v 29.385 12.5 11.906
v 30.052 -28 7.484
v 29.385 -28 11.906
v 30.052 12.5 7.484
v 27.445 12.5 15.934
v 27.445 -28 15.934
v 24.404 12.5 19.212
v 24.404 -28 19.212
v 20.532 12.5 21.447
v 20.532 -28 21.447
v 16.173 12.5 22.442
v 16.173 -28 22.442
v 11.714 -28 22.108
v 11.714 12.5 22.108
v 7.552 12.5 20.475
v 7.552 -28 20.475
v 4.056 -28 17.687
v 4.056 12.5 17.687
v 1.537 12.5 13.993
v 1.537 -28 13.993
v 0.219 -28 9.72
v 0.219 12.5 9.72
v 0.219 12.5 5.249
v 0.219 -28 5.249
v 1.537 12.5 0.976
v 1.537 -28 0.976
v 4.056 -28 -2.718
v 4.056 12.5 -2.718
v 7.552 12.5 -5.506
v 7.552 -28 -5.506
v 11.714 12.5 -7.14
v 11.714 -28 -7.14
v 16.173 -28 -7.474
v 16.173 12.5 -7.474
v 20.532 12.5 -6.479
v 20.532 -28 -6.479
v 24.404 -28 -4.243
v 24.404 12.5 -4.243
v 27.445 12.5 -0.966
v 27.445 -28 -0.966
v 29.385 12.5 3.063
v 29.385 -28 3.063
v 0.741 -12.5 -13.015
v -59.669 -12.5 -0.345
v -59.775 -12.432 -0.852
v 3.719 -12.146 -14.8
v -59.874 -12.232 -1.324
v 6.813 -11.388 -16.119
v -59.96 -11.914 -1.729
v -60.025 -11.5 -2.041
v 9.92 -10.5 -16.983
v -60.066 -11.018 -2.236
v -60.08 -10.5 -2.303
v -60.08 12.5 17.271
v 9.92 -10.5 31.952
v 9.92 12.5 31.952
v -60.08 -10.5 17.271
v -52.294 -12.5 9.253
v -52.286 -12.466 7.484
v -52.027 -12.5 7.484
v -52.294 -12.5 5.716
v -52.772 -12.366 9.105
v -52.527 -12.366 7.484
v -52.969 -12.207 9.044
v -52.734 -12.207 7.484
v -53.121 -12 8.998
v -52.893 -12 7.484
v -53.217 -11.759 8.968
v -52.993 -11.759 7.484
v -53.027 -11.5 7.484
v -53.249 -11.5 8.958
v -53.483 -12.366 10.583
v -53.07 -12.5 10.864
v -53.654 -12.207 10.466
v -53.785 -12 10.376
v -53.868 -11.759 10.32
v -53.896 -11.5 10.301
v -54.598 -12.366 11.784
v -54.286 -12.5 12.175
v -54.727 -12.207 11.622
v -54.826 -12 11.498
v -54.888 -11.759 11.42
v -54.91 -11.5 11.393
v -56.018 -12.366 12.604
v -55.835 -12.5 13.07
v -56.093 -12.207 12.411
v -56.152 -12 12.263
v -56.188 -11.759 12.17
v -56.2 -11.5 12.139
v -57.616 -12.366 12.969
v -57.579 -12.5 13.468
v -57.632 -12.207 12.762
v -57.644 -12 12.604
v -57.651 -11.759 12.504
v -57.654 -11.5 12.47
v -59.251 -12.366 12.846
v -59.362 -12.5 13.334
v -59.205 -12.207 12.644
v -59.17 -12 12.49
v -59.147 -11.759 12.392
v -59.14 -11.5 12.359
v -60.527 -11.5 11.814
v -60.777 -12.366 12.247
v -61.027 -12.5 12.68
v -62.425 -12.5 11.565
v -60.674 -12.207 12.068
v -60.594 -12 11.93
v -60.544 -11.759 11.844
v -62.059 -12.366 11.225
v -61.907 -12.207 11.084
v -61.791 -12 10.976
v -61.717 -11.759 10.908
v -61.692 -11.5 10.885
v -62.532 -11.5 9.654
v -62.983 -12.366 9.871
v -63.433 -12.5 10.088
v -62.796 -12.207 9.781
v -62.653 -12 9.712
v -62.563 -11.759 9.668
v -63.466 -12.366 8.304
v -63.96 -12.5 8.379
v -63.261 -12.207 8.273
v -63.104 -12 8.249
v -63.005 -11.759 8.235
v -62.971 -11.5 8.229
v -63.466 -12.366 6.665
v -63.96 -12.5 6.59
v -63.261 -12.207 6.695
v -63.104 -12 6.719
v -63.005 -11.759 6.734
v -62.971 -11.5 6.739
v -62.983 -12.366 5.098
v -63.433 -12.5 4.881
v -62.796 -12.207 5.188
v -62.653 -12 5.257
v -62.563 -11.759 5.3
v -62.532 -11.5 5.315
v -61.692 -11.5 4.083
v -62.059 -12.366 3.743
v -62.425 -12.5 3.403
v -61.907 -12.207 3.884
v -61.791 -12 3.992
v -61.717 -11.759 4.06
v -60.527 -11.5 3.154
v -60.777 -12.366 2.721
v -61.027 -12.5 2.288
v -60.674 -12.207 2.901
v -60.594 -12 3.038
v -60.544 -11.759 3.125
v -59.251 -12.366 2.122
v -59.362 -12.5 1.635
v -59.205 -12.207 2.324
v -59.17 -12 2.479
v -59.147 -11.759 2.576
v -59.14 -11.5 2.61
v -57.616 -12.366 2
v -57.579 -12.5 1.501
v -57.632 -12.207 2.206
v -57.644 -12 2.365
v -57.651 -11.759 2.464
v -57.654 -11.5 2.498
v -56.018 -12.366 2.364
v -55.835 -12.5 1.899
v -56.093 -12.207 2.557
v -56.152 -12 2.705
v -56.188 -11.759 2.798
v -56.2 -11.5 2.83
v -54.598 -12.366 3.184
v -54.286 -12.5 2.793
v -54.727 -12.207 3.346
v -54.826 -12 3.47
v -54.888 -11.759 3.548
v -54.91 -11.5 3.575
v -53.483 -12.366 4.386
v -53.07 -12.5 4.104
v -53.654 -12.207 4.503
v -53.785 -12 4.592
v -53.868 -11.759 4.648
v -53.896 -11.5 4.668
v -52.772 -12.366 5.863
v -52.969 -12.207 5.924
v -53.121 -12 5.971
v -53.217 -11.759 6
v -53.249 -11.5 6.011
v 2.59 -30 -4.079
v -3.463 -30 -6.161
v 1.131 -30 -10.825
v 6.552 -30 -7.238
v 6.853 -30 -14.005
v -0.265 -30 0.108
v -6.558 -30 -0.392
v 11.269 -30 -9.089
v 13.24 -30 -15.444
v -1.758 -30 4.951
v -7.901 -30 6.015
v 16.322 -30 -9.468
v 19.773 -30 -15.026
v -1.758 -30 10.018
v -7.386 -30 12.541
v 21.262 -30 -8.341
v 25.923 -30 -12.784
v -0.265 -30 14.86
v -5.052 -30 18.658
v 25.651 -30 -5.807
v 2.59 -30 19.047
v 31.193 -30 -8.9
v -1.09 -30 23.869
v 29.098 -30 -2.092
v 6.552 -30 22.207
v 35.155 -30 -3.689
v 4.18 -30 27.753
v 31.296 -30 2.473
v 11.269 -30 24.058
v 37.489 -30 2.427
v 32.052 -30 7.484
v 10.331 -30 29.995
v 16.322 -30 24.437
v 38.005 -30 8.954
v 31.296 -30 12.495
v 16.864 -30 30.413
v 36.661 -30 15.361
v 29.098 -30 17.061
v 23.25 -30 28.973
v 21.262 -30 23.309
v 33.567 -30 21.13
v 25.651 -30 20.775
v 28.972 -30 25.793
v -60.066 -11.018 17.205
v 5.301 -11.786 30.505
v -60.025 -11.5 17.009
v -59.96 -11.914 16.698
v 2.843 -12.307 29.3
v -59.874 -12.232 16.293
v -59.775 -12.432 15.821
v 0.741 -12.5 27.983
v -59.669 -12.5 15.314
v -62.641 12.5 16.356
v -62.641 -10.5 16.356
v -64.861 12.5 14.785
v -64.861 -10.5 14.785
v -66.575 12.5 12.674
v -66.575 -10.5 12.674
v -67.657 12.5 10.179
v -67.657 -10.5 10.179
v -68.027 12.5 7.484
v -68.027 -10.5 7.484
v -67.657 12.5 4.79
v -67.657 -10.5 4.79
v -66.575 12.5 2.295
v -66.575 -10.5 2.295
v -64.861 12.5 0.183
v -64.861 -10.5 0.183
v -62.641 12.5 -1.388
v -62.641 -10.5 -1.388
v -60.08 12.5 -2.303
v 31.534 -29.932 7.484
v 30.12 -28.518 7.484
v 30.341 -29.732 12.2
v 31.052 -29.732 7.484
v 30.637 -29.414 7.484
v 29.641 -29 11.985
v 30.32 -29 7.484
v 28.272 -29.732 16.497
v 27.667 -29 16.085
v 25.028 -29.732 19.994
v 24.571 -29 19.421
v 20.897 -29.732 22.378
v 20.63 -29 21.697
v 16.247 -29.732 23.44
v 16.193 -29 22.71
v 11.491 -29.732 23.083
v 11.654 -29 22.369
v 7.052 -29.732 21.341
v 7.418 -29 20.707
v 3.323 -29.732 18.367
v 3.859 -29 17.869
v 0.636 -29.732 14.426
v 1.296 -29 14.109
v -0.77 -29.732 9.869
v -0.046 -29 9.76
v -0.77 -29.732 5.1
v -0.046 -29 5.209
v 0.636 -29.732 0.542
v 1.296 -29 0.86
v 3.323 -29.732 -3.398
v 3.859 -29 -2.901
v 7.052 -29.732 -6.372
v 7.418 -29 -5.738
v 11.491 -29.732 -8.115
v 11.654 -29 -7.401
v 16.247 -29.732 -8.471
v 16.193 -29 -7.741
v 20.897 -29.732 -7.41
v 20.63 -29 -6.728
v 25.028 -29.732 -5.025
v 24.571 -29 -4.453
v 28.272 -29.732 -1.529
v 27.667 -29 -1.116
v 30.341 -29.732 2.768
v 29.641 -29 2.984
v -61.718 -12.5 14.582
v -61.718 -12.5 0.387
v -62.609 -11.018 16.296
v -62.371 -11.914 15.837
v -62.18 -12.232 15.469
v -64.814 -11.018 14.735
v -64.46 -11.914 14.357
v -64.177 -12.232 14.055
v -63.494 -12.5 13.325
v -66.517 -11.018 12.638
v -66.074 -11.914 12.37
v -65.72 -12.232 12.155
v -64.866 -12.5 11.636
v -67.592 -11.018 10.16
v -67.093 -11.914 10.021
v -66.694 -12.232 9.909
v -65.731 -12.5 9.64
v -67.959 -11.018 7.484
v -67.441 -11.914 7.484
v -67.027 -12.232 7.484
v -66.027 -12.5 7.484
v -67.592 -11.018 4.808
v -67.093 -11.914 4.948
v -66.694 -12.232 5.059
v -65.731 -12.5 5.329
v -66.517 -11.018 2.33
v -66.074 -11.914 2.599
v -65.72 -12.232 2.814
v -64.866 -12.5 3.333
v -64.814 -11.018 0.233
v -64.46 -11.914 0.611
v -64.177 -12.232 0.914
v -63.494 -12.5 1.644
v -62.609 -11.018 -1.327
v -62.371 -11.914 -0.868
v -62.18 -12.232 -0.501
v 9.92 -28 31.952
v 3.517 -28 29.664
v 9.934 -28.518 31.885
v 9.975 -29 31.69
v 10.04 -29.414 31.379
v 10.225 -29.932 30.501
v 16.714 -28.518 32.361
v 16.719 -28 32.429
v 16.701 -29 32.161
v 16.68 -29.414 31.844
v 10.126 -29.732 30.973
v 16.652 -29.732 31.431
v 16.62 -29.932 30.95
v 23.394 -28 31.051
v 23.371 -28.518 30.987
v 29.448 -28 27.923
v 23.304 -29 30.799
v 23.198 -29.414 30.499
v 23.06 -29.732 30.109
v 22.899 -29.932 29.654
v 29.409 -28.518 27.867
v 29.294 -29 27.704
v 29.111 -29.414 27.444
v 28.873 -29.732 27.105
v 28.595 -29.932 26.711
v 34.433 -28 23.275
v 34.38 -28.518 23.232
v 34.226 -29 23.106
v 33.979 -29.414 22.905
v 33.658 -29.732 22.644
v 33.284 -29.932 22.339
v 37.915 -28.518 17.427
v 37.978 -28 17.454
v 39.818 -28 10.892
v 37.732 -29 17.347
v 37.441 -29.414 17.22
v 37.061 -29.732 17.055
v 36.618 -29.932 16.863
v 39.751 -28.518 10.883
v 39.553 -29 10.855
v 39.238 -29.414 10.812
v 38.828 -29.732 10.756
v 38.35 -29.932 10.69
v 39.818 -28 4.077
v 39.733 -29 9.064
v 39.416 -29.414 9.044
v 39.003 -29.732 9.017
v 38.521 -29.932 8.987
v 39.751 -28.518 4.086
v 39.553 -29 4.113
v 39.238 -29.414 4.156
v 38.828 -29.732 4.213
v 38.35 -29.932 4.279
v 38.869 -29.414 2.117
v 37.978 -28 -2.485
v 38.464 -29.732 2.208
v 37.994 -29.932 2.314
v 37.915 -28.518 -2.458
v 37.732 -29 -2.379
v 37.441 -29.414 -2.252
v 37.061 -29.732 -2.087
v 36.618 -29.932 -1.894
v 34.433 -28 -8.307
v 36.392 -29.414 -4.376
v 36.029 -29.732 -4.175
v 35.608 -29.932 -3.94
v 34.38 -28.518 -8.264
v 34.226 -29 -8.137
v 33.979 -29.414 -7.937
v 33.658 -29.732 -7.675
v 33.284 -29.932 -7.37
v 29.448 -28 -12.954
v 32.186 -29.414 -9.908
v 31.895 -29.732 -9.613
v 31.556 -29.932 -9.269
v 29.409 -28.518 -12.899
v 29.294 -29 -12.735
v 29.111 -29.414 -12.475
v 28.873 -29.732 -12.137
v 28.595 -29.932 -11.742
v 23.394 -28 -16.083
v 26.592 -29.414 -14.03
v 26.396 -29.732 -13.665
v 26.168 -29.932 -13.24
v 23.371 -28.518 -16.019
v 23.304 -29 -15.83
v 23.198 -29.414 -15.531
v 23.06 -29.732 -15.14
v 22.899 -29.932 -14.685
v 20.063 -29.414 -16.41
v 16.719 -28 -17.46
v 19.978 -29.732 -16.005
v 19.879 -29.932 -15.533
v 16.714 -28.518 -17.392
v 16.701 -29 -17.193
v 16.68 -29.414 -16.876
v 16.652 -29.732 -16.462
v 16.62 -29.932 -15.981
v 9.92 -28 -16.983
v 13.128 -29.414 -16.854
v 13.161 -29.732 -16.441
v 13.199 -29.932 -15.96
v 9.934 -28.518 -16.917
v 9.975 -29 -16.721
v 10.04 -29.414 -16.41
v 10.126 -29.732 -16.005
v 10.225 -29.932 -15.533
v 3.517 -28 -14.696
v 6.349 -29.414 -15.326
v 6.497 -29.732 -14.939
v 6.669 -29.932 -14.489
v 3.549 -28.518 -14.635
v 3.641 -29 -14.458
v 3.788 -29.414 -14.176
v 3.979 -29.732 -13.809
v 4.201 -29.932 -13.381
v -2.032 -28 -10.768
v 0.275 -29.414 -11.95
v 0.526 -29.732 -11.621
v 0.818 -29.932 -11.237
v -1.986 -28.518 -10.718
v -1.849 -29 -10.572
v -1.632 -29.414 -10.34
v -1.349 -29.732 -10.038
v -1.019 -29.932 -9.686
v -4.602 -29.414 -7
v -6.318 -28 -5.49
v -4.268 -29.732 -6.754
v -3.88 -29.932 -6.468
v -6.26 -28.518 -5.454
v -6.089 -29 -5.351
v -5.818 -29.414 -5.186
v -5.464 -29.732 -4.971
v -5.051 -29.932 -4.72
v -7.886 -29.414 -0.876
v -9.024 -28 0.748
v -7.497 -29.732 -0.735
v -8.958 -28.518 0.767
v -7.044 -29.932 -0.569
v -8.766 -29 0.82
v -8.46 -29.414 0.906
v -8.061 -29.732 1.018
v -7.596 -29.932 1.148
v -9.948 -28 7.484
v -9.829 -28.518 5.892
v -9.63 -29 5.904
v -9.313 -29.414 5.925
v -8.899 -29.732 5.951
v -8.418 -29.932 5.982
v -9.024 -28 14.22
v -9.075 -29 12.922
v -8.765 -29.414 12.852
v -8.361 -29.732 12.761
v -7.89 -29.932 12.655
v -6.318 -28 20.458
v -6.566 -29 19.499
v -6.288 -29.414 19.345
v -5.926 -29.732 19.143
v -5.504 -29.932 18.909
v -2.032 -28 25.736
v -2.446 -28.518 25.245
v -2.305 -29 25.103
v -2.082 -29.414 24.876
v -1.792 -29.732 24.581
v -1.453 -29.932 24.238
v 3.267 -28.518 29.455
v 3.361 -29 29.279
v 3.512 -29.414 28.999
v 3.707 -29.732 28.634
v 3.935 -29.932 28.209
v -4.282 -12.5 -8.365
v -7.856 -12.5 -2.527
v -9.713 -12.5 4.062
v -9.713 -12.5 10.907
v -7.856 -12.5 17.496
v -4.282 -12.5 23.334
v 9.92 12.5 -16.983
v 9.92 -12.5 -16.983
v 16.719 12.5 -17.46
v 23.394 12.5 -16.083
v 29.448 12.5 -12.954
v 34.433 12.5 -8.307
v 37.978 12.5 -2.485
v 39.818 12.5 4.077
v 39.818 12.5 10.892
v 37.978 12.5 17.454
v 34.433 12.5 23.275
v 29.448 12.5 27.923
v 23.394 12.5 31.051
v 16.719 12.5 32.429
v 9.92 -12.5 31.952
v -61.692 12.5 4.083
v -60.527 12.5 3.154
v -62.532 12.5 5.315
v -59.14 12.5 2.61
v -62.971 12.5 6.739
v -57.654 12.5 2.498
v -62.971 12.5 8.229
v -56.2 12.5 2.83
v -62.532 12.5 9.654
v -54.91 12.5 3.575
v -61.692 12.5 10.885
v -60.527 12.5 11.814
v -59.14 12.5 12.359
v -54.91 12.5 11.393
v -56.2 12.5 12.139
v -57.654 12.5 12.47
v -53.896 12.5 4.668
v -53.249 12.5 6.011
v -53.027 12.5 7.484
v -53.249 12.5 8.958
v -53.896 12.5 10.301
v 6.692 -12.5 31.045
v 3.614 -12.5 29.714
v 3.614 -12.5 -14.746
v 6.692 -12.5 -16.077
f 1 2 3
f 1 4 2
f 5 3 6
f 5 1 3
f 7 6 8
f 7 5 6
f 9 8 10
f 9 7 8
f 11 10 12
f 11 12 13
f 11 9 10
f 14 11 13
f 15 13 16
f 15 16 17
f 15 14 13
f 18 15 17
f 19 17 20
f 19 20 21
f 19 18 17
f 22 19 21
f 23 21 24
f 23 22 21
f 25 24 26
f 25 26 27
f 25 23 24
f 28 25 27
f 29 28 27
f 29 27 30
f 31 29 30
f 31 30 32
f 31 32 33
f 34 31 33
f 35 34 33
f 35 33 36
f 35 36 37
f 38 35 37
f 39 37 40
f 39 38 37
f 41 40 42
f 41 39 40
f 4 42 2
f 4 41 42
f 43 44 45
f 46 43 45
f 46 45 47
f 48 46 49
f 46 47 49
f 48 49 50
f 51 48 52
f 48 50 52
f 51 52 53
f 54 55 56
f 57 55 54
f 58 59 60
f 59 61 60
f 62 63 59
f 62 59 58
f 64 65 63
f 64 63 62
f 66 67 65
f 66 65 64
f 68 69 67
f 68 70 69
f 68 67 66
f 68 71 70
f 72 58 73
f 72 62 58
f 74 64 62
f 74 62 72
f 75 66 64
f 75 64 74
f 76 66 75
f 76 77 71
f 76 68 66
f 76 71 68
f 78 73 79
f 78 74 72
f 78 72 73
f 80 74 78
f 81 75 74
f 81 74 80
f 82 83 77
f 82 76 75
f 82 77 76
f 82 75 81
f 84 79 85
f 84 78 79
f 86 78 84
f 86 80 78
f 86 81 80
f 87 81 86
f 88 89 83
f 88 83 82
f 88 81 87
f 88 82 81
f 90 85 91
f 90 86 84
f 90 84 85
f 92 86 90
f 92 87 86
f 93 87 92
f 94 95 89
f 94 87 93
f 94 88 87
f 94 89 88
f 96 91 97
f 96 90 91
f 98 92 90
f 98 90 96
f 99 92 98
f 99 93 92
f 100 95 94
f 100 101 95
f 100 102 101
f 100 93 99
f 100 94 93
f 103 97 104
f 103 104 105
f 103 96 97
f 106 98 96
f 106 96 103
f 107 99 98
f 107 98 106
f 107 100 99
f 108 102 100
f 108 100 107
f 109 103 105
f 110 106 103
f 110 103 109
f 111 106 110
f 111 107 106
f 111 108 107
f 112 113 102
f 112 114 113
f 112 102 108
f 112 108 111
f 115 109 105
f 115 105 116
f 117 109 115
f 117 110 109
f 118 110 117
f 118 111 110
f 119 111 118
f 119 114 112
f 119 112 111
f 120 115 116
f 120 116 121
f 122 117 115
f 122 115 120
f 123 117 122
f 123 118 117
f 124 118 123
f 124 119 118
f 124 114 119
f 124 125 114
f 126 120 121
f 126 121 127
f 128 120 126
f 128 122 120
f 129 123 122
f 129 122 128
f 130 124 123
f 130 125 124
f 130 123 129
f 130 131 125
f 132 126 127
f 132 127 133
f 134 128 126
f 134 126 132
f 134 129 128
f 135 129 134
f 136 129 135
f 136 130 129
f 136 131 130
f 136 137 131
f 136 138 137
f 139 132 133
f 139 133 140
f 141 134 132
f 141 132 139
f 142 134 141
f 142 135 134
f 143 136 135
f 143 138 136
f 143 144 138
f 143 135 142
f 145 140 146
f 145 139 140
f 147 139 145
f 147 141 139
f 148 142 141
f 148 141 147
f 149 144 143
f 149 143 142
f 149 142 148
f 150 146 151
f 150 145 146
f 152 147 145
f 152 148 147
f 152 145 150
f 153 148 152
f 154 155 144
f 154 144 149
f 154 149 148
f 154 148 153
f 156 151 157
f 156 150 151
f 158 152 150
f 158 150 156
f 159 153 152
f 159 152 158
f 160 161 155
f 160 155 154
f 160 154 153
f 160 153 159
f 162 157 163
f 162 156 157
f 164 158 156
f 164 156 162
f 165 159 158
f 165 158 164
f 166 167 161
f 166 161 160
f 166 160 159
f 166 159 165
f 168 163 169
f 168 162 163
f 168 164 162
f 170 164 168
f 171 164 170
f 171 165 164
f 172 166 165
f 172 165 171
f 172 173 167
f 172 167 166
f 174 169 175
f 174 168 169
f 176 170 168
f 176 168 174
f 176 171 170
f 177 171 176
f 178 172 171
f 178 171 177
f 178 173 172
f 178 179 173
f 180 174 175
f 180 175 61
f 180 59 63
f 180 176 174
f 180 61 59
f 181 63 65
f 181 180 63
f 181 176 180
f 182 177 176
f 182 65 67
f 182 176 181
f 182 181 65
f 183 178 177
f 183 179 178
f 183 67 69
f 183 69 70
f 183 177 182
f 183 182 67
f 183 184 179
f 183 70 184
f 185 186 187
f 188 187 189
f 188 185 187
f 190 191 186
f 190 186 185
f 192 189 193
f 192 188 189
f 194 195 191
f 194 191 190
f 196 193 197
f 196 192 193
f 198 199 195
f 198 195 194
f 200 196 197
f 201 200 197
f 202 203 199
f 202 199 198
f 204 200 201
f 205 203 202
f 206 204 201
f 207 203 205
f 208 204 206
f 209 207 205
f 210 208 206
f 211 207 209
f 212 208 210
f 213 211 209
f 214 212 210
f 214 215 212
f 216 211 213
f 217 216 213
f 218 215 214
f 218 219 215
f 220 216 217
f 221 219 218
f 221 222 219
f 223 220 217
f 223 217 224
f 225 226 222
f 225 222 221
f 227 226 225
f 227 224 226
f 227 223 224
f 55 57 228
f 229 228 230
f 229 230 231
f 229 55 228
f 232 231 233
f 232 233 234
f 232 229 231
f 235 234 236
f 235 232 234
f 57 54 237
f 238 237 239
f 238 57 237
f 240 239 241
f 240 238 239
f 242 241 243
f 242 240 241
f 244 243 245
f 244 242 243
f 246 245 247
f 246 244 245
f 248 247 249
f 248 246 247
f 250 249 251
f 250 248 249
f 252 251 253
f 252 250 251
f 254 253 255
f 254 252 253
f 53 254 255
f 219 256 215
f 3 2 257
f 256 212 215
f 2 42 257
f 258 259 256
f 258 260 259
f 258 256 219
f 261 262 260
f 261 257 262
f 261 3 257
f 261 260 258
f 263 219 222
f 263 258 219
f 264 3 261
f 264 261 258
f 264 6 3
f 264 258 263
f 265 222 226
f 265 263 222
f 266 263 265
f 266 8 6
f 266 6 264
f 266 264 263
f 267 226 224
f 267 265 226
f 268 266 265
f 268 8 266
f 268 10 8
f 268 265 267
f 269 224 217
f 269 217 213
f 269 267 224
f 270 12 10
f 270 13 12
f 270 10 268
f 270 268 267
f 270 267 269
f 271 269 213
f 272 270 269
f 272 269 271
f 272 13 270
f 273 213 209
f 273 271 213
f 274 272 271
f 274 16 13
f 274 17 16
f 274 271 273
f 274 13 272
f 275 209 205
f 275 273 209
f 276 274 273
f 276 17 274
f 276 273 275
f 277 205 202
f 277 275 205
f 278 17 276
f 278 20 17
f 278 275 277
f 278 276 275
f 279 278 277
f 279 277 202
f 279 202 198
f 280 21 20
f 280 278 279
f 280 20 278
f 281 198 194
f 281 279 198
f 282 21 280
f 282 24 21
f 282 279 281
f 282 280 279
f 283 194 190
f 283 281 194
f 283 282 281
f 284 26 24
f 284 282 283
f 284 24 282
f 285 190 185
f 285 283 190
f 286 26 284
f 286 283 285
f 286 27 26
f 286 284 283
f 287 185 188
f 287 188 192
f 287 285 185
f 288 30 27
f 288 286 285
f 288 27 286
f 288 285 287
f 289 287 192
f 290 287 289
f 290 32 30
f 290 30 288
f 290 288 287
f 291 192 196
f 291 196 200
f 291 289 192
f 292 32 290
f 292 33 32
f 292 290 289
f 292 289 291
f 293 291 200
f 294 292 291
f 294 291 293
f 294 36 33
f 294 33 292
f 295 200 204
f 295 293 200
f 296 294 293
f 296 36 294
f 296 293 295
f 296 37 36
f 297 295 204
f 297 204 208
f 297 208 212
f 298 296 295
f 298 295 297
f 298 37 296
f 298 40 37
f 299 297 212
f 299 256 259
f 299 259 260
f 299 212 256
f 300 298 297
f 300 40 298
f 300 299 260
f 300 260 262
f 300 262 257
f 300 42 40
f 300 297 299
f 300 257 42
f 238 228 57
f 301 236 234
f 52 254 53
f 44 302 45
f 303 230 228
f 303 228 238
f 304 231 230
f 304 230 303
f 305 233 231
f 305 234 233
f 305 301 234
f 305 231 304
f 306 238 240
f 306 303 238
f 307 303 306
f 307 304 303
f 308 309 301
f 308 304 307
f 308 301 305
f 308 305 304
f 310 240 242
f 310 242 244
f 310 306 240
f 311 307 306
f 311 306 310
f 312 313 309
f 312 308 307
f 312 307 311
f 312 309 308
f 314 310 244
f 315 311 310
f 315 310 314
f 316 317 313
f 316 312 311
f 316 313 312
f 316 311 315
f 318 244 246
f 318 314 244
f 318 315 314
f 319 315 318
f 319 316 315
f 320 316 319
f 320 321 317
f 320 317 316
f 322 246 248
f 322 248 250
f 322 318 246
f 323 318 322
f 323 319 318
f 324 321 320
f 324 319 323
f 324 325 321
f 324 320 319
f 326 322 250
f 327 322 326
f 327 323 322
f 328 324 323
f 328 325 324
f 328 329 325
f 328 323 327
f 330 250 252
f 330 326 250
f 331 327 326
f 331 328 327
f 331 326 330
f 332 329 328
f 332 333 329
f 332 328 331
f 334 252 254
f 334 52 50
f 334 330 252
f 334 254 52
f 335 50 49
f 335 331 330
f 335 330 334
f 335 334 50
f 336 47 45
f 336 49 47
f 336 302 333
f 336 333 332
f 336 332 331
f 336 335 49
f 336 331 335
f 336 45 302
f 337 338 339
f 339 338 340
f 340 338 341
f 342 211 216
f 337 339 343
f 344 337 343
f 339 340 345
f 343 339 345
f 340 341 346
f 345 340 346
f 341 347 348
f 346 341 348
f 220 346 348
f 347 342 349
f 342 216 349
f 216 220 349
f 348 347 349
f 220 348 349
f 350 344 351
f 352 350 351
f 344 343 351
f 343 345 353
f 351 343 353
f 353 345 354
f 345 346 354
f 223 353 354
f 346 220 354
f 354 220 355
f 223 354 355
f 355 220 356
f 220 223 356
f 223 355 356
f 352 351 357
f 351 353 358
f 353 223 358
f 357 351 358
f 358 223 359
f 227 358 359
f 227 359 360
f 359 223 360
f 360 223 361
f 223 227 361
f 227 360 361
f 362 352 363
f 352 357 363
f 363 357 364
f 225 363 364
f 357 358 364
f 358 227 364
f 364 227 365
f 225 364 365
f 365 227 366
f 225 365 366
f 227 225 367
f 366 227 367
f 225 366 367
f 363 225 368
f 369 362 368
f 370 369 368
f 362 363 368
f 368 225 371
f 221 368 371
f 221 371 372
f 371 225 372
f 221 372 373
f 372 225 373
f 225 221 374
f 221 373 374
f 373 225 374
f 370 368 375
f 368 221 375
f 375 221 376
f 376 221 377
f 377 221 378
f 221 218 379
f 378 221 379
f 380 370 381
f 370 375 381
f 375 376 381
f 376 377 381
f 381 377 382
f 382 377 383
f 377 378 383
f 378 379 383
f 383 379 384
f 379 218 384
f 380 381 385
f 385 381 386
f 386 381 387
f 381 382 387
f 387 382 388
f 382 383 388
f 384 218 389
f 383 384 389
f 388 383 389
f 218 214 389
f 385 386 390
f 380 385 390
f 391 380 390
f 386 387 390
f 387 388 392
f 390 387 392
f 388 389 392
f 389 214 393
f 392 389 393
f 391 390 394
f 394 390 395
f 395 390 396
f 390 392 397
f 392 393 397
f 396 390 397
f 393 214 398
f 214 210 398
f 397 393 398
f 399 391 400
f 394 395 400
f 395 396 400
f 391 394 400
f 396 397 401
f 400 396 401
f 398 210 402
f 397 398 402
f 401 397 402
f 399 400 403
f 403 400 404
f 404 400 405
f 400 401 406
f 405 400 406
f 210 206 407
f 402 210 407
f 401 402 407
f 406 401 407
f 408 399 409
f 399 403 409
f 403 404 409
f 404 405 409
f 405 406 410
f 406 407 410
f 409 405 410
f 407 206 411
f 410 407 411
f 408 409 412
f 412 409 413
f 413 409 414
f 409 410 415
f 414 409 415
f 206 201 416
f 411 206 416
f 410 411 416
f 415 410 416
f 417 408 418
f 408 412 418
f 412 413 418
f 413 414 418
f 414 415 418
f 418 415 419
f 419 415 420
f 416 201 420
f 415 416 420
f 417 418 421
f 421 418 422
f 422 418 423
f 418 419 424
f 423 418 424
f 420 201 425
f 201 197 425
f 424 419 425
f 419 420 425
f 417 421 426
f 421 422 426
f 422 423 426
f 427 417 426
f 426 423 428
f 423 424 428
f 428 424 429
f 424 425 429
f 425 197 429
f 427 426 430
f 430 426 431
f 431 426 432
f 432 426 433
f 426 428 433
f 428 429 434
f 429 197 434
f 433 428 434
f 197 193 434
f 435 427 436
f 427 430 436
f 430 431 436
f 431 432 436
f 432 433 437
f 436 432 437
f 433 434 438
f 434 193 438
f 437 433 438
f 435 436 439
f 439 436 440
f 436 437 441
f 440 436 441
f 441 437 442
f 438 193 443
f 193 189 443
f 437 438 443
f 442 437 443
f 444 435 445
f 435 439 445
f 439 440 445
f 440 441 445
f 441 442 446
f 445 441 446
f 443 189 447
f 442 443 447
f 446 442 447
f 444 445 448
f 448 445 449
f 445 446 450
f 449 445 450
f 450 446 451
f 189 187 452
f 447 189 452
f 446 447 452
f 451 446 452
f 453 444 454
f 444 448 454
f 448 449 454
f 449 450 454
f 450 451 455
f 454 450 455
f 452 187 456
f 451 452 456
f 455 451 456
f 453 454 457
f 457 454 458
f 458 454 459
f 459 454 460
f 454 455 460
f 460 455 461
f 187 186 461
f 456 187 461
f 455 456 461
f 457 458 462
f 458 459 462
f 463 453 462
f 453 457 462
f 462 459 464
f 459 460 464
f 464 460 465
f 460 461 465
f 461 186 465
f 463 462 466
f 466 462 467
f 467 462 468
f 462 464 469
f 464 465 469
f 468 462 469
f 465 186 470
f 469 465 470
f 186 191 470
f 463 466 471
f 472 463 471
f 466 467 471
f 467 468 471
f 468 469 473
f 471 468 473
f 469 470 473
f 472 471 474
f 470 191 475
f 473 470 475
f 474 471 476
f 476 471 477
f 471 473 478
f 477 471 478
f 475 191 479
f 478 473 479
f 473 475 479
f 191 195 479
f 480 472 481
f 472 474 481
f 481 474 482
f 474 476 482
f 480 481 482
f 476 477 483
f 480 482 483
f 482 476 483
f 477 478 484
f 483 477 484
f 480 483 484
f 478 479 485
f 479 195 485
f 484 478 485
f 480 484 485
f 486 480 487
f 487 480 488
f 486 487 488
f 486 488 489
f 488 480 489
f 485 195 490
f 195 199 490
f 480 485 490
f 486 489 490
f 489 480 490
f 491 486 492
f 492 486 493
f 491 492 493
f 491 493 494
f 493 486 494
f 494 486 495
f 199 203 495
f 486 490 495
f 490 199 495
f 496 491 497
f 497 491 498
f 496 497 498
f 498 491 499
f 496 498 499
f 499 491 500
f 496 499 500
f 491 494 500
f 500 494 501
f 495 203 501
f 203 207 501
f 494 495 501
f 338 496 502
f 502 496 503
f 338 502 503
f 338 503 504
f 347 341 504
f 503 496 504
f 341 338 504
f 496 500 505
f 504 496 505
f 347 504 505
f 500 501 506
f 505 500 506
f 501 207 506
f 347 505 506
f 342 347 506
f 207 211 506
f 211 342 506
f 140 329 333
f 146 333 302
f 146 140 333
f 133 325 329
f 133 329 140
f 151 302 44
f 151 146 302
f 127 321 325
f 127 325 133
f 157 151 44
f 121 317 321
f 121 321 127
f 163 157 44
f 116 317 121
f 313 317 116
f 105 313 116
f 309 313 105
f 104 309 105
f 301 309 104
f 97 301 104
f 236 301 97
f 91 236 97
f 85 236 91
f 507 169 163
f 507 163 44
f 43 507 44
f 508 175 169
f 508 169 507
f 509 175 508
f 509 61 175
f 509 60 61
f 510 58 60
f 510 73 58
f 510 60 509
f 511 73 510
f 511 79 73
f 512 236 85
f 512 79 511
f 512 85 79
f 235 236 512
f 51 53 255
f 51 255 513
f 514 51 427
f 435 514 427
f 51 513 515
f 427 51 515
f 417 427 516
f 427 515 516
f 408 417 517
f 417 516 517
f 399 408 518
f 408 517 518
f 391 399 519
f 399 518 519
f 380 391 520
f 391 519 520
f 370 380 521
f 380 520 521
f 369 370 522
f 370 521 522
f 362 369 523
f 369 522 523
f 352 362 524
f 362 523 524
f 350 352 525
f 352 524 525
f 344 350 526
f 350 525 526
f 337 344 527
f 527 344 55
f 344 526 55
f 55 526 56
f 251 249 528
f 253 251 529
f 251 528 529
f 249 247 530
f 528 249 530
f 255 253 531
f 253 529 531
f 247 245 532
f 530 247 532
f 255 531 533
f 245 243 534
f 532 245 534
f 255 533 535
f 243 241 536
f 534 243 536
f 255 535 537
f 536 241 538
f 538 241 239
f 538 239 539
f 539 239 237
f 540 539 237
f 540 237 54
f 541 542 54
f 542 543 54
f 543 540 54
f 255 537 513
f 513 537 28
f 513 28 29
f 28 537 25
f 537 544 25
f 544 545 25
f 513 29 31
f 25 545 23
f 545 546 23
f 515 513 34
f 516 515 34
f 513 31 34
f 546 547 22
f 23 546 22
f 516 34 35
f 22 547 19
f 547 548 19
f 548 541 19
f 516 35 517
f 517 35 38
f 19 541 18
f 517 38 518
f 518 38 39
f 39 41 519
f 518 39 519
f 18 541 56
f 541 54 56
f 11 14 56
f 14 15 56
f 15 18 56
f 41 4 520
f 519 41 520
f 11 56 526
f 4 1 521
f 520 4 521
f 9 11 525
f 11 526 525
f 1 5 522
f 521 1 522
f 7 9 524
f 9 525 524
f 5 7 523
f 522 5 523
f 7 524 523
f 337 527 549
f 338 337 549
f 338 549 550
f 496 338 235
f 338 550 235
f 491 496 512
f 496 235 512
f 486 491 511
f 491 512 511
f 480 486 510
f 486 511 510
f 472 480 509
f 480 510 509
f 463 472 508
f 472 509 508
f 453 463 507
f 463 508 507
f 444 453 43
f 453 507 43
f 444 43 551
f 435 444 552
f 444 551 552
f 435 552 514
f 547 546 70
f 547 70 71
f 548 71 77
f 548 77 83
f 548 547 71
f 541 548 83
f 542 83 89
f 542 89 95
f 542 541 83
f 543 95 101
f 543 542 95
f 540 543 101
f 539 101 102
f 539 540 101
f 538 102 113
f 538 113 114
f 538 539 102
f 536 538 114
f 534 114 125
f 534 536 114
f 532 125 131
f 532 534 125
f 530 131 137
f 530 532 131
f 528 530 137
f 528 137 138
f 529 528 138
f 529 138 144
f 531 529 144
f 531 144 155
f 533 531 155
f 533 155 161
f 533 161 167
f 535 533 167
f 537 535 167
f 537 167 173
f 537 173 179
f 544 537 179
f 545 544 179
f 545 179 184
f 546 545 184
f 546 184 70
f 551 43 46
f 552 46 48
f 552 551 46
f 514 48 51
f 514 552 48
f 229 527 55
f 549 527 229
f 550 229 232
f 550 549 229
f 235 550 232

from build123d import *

# Parameters (mm, degrees)
F0_R         = 15
F0_R_2       = 5
F1_DEPTH     = 12.5
F2_DEPTH     = 30
F3_T4_DEPTH  = 86.5228675813
F3_S5_R      = 25
F3_T6_DEPTH  = 45
F3_T8_ANGLE  = 156.3108298238
F3_T12_DEPTH = 86.5228675813
F3_S13_R     = 25
F3_T14_DEPTH = 45
F4_R         = 1


# Not quite as in the source:
# - a fillet or chamfer that OpenCascade refuses, or shapes differently, is made with other operations: its cross-section is extruded or revolved along the edge and cut away or added


with BuildPart() as f1:
    # F0 (on Front) → F1 (new body, symmetric)
    with BuildSketch(Plane.XZ):
        with BuildLine():
            ThreePointArc((-60.0797491716, 17.2713649638), (-51.7234339832, 15.247202645), (-48.0271721521, 7.4842853392))
            ThreePointArc((-48.0271721521, 7.4842853392), (-51.7234339832, -0.2786319667), (-60.0797491716, -2.3027942855))
            Line((-60.0797491716, -2.3027942855), (9.9202508284, -16.9834137224))
            ThreePointArc((9.9202508284, -16.9834137224), (-9.9483066228, 7.4842853392), (9.9202508284, 31.9519844007))
            Line((9.9202508284, 31.9519844007), (-60.0797491716, 17.2713649638))
        make_face()
        with BuildLine():
            ThreePointArc((40.0516933772, 7.4842853392), (30.8110387995, 26.8915786038), (9.9202508284, 31.9519844007))
            ThreePointArc((9.9202508284, 31.9519844007), (-9.9483066228, 7.4842853392), (9.9202508284, -16.9834137224))
            ThreePointArc((9.9202508284, -16.9834137224), (30.8110387995, -11.9230079255), (40.0516933772, 7.4842853392))
        make_face()
        with Locations((15.0516933772, 7.4842853392)):
            Circle(F0_R, mode=Mode.SUBTRACT)
        with BuildLine():
            ThreePointArc((-60.0797491716, -2.3027942855), (-51.7234339832, -0.2786319667), (-48.0271721521, 7.4842853392))
            ThreePointArc((-48.0271721521, 7.4842853392), (-51.7234339832, 15.247202645), (-60.0797491716, 17.2713649638))
            ThreePointArc((-60.0797491716, 17.2713649638), (-68.0271721521, 7.4842853392), (-60.0797491716, -2.3027942855))
        make_face()
        with Locations((-58.0271721521, 7.4842853392)):
            Circle(F0_R_2, mode=Mode.SUBTRACT)
    extrude(amount=F1_DEPTH, both=True)

    # F0 (on Front) → F2 (join)
    with BuildSketch(Plane.XZ):
        with BuildLine():
            ThreePointArc((40.0516933772, 7.4842853392), (30.8110387995, 26.8915786038), (9.9202508284, 31.9519844007))
            ThreePointArc((9.9202508284, 31.9519844007), (-9.9483066228, 7.4842853392), (9.9202508284, -16.9834137224))
            ThreePointArc((9.9202508284, -16.9834137224), (30.8110387995, -11.9230079255), (40.0516933772, 7.4842853392))
        make_face()
        with Locations((15.0516933772, 7.4842853392)):
            Circle(F0_R, mode=Mode.SUBTRACT)
    extrude(amount=F2_DEPTH)

    # F3: fillet of radius 2 on 5 edges, made by hand


with BuildPart() as f3_tool2:
    # F3_s3 → F3_t4 (new body)
    with BuildSketch(Plane(origin=(-57.0859435933, 0, 11.9722430442), x_dir=(0, 1, 0), z_dir=(0.9787079625, 0, -0.205257702))):
        with BuildLine():
            ThreePointArc((-12.5, -12.5855943521), (-11.9142135624, -13.9998079144), (-10.5, -14.5855943521))
            Line((-10.5, -14.5855943521), (-12.5, -14.5855943521))
            Line((-12.5, -14.5855943521), (-12.5, -12.5855943521))
        make_face()
    extrude(amount=F3_T4_DEPTH)

    # F3_s5 → F3_t6 (cut, symmetric)
    with BuildSketch(Plane.XZ.offset(11.5)):
        with Locations((15.0516933772, 7.4842853392)):
            Circle(F3_S5_R)
    extrude(amount=F3_T6_DEPTH, both=True, mode=Mode.SUBTRACT)


with BuildPart() as f1_1:
    add(f1.part)

    # F3_t1: cut F3_tool2
    add(f3_tool2.part, mode=Mode.SUBTRACT)

    # F3_s7 → F3_t8 (revolve, cut)
    with BuildSketch(Plane(origin=(-54.0789471374, 0, -11.3416063211), x_dir=(0, 1, 0), z_dir=(0.9787079625, 0, 0.205257702))):
        with BuildLine():
            ThreePointArc((-10.5, 29.2354536617), (-11.9142135624, 28.649667224), (-12.5, 27.2354536617))
            Line((-12.5, 27.2354536617), (-12.5, 29.2354536617))
            Line((-12.5, 29.2354536617), (-10.5, 29.2354536617))
        make_face()
    revolve(axis=Axis((-58.0271721521, -12.5, 7.4842853392), (0, -1, 0)), revolution_arc=F3_T8_ANGLE, mode=Mode.SUBTRACT)


with BuildPart() as f3_tool10:
    # F3_s11 → F3_t12 (new body)
    with BuildSketch(Plane(origin=(30.6016722995, 0, 6.4178786452), x_dir=(0, 1, 0), z_dir=(-0.9787079625, 0, -0.205257702))):
        with BuildLine():
            ThreePointArc((-10.5, -29.2354536617), (-11.9142135624, -28.649667224), (-12.5, -27.2354536617))
            Line((-12.5, -27.2354536617), (-12.5, -29.2354536617))
            Line((-12.5, -29.2354536617), (-10.5, -29.2354536617))
        make_face()
    extrude(amount=F3_T12_DEPTH)

    # F3_s13 → F3_t14 (cut, symmetric)
    with BuildSketch(Plane.XZ.offset(11.5)):
        with Locations((15.0516933772, 7.4842853392)):
            Circle(F3_S13_R)
    extrude(amount=F3_T14_DEPTH, both=True, mode=Mode.SUBTRACT)


with BuildPart() as f1_2:
    add(f1_1.part)

    # F3_t9: cut F3_tool10
    add(f3_tool10.part, mode=Mode.SUBTRACT)

    # F3_s15 → F3_t16 (revolve, cut)
    with BuildSketch(Plane(origin=(15.9210528626, 0, 3.3390131159), x_dir=(0, 1, 0), z_dir=(-0.9787079625, 0, -0.205257702))):
        with BuildLine():
            ThreePointArc((-28, -29.2354536617), (-29.4142135624, -28.649667224), (-30, -27.2354536617))
            Line((-30, -27.2354536617), (-30, -29.2354536617))
            Line((-30, -29.2354536617), (-28, -29.2354536617))
        make_face()
    revolve(axis=Axis((15.0516933772, -30, 7.4842853392), (0, 1, 0)), mode=Mode.SUBTRACT)

    # F3_s17 → F3_t18 (revolve, cut)
    with BuildSketch(Plane.XY.offset(7.4842853392)):
        with BuildLine():
            ThreePointArc((32.0516933772, -30), (30.6374798149, -29.4142135624), (30.0516933772, -28))
            Line((30.0516933772, -28), (30.0516933772, -30))
            Line((30.0516933772, -30), (32.0516933772, -30))
        make_face()
    revolve(axis=Axis((15.0516933772, -30, 7.4842853392), (0, -1, 0)), mode=Mode.SUBTRACT)

    # F4
    f4_edges = [f1_2.edges().sort_by_distance(p)[0] for p in [
        (-63.027172, -12.5, 7.484285),
    ]]
    fillet(f4_edges, radius=F4_R)


solid = f1_2.part
